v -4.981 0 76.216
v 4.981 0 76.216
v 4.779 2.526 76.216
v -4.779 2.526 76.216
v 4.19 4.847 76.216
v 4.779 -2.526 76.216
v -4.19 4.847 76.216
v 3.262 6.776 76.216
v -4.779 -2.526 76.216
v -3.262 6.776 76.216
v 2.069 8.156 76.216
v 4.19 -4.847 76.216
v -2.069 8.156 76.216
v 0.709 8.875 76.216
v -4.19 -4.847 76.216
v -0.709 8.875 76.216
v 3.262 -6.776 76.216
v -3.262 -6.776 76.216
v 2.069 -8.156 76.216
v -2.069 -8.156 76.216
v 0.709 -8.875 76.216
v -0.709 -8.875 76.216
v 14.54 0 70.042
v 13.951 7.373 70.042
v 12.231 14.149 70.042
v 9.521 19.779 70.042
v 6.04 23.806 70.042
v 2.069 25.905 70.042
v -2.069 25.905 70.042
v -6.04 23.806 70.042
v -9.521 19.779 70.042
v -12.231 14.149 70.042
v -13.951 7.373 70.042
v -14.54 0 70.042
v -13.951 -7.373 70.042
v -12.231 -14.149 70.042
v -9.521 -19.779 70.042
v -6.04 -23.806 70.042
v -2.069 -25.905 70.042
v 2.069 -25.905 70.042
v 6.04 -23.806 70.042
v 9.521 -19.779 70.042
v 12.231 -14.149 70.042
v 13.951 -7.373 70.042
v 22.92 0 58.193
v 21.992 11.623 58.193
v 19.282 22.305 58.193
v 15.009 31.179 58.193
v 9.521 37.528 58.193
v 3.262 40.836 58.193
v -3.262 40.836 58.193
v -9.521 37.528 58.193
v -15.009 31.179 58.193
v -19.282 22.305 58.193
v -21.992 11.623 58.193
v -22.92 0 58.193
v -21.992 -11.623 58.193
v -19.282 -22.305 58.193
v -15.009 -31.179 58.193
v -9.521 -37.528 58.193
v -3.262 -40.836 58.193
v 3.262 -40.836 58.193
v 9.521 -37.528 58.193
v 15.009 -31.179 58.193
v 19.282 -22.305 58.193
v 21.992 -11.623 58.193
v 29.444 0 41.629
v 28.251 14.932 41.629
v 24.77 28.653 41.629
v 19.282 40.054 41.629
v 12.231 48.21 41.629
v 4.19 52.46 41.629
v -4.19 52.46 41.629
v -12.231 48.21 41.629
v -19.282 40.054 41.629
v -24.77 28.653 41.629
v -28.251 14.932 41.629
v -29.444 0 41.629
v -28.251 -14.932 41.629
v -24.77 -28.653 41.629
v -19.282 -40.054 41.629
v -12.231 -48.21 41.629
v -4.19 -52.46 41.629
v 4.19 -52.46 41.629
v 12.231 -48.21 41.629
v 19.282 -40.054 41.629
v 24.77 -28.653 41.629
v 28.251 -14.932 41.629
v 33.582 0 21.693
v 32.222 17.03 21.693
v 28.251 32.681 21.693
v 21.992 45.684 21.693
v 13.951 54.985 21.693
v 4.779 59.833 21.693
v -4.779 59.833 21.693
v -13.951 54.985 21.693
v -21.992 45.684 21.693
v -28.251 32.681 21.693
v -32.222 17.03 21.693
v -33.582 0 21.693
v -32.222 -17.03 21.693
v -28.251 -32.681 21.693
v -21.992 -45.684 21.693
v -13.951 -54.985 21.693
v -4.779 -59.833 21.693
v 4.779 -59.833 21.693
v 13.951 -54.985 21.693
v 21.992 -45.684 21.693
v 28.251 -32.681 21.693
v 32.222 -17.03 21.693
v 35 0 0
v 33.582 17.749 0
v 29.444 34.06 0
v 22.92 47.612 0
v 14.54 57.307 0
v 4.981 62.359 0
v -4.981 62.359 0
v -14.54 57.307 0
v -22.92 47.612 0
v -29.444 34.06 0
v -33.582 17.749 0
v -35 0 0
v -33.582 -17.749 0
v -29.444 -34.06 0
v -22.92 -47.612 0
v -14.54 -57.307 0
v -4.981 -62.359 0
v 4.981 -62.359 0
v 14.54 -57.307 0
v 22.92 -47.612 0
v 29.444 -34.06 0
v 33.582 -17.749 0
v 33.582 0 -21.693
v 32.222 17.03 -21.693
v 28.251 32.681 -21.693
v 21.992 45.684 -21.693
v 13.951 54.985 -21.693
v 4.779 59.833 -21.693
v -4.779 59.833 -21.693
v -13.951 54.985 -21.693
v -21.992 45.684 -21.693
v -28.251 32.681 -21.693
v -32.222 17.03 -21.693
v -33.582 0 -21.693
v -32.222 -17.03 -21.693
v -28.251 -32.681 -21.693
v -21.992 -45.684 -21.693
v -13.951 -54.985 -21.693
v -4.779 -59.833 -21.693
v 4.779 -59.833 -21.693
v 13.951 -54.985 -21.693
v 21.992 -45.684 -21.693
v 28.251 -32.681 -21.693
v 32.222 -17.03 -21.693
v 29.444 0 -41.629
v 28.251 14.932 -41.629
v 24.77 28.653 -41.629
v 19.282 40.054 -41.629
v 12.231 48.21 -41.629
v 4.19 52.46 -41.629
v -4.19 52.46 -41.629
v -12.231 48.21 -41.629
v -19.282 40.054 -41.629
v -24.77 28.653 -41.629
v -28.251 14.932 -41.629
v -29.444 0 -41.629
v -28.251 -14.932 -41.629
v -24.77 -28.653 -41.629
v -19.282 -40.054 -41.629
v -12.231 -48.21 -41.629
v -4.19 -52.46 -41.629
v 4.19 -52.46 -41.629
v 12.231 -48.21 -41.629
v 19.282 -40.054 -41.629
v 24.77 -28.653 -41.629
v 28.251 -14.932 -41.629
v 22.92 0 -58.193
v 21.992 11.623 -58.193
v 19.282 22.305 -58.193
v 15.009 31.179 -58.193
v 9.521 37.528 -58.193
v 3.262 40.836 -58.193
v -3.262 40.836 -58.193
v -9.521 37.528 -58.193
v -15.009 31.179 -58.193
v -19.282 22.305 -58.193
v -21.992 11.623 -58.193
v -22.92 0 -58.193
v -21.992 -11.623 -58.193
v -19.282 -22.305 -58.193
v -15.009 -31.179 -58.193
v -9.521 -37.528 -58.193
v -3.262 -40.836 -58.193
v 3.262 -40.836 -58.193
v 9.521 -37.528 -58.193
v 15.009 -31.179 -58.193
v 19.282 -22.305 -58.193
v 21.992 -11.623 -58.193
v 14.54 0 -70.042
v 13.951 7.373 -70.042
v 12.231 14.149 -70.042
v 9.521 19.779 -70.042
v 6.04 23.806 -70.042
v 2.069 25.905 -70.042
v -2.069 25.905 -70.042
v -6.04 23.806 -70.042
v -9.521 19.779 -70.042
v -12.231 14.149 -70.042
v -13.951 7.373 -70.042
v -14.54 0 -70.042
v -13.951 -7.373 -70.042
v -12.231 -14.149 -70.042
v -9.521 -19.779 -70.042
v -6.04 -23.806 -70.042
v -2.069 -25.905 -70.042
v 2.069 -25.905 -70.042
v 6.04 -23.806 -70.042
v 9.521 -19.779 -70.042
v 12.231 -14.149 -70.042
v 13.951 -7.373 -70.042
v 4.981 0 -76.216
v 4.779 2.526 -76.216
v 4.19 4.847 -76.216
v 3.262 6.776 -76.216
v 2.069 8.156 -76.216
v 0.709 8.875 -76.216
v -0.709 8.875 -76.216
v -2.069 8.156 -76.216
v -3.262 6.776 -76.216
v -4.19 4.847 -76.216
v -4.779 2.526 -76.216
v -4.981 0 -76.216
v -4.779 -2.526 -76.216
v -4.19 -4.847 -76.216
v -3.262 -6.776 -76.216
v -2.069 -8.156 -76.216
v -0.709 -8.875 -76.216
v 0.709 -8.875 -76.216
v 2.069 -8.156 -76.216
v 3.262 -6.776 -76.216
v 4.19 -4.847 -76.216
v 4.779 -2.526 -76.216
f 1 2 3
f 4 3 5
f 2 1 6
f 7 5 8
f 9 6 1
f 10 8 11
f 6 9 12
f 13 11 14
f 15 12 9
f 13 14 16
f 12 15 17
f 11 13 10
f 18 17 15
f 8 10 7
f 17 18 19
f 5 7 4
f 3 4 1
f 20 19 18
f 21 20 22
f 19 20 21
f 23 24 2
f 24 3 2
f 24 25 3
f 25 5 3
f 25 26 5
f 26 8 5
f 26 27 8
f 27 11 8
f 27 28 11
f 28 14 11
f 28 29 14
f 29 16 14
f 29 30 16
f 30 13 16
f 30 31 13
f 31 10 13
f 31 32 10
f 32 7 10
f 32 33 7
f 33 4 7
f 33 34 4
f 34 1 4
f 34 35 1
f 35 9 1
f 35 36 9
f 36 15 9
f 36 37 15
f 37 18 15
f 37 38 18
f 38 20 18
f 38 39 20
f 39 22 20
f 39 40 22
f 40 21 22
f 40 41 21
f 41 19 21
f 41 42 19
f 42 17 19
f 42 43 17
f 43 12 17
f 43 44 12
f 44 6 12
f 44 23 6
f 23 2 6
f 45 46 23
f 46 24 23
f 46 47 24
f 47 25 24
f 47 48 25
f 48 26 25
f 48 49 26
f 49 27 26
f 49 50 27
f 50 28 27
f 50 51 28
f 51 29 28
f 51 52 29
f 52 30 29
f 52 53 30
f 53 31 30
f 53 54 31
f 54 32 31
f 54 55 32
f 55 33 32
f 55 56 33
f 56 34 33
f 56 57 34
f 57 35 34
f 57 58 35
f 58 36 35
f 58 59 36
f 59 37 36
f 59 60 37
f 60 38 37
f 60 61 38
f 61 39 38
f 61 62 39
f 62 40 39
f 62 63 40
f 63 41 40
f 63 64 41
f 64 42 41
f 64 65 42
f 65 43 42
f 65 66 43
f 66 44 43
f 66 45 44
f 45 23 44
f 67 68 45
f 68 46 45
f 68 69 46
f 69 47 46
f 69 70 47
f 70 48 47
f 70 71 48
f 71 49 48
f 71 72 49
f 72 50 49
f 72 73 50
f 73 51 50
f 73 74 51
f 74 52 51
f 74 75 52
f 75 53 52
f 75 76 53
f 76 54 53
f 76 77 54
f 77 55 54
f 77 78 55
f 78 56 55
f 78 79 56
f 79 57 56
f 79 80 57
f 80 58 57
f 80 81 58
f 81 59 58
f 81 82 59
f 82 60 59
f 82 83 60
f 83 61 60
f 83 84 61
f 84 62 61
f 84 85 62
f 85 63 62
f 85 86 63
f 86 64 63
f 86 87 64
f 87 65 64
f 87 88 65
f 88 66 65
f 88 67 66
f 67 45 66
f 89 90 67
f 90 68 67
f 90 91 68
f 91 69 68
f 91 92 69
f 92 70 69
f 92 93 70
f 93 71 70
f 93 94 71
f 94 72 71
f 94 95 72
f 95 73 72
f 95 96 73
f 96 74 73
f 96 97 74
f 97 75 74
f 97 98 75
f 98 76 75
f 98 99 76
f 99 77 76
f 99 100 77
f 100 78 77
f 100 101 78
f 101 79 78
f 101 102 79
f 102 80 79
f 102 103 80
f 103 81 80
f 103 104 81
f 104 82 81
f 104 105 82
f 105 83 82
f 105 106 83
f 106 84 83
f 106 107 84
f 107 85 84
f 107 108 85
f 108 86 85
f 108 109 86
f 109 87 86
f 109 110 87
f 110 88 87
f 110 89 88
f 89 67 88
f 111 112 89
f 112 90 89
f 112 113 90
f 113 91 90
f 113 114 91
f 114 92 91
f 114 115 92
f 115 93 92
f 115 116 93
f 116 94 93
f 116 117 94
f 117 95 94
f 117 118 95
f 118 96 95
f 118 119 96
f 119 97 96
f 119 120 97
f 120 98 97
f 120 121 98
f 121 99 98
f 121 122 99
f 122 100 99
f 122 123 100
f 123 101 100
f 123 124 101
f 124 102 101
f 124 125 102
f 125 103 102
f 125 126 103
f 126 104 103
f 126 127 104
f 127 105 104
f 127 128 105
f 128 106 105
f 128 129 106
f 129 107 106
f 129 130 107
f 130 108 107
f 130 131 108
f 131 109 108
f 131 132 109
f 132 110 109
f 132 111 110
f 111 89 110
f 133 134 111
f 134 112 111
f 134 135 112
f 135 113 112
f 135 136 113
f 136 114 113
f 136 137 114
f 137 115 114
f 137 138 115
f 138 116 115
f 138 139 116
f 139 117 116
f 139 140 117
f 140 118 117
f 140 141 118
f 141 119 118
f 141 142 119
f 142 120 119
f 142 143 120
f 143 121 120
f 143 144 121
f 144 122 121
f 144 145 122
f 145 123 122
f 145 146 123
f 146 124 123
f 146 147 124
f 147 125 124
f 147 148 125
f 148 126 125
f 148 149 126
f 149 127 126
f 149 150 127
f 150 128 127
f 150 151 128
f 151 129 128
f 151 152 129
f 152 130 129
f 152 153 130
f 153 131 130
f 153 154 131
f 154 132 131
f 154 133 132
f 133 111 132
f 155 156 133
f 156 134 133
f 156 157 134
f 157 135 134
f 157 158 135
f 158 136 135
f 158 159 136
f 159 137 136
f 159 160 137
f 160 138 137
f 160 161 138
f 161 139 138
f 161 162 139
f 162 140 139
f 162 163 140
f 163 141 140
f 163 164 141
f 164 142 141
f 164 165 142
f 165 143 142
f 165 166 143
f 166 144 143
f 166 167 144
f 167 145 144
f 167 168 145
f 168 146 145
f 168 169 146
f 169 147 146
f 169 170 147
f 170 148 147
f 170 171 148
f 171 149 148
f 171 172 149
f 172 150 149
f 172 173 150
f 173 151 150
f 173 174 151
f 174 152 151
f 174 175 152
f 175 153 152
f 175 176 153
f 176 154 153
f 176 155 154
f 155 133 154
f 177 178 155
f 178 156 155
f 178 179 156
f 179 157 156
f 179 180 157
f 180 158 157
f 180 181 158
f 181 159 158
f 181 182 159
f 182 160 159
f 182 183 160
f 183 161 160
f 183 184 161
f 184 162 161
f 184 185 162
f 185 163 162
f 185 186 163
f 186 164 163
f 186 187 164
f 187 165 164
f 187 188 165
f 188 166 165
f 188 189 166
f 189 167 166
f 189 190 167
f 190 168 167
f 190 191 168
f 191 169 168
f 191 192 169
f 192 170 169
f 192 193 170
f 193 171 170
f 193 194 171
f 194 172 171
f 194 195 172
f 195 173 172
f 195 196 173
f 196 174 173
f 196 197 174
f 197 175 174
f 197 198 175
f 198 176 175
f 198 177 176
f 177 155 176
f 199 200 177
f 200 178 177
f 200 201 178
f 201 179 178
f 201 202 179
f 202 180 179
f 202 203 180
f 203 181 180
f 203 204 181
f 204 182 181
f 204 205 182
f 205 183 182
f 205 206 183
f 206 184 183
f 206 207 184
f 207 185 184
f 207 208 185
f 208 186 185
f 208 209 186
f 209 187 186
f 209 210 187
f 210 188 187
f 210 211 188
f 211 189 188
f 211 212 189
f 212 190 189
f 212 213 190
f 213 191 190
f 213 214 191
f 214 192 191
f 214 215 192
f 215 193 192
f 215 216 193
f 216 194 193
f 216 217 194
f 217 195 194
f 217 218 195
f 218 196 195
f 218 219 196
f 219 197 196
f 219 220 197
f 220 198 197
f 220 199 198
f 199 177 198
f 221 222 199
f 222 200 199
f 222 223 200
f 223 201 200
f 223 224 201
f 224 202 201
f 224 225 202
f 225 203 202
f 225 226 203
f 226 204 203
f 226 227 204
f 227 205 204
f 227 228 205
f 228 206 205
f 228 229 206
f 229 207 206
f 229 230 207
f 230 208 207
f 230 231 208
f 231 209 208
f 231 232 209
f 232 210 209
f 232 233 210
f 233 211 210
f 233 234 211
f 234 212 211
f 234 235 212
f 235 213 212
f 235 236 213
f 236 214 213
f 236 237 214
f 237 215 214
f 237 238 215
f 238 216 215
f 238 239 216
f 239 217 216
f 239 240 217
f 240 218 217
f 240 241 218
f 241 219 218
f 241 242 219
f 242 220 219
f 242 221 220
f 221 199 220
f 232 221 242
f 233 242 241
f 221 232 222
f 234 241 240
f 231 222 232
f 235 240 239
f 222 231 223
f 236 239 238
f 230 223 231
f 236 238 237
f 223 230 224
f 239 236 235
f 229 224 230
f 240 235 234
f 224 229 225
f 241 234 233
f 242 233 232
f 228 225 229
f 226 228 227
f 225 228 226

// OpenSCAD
// Generated by SolidPython 1.0.1 on 2020-07-29 00:46:46


scale(v = [5, 9, 11]) {
	sphere(r = 7);
}
/***********************************************
*********      SolidPython code:      **********
************************************************
 
# import packages: SolidPython
from solid import *
from solid.utils import *
from itertools import chain, combinations, permutations


class Resize:

    def __init__(self, scad_file):
        self.scad_file = scad_file
        #self.scad_file = import_scad(scad_file)
        # cone/cylinder param:
        self.r1 = 0
        self.r2 = 0
        self.h = 0
        # rectangular prism param:
        self.w = 0
        self.l = 0
        # ellipse param:
        self.r = 0

    # import OpenScad code (file name corresponds to shape)


    # classify shape + parameters
    def assign(self, param1, param2, param3):
        if self.scad_file == 'cone.scad':
            self.r1 = param1
            self.r2 = param2
            self.h = param3
        elif self.scad_file == 'cylinder.scad':
            self.r1 = param1
            self.r2 = param2
            self.h = param3
        elif self.scad_file == 'rectangularPrism.scad':
            self.h = param1
            self.l = param2
            self.w = param3
        else:
            self.r = param1
            self.h = param2

    # resize parameters
    def iterate(self):
        x = range(3, 20, 2)
        i = 1
        if self.scad_file == 'cone.scad':
            tempList = list(permutations(x, 2))
            for temp in tempList:
                param1 = temp[0]
                param2 = temp[1]
                filepath = 'produced_scad_files/' + 'cone' + str(param1) + '_' + str(param2) + '_' + '.scad'
                scad_render_to_file(cylinder(h=param1, r1=param2, r2=0), filepath)

        elif self.scad_file == 'cylinder.scad':
            tempList = list(permutations(x, 3))
            for temp in tempList:
                param1 = temp[0]
                param2 = temp[1]
                filepath = 'produced_scad_files/' + 'cylinder' + str(param1) + '_' + str(param2) + '_' + '.scad'
                scad_render_to_file(cylinder(h=param1, r1=param2, r2=param2), filepath)

        elif self.scad_file == 'rectangularPrism.scad':
            tempList = list(permutations(x, 3))
            for temp in tempList:
                param1 = temp[0]
                param2 = temp[1]
                param3 = temp[2]
                filepath = 'produced_scad_files/' + 'rectangularPrism' + str(param1) + '_' + str(param2) + '_' + str(
                    param3) + '.scad'
                scad_render_to_file(cube(size=(param1, param2, param3)), filepath)

        elif self.scad_file == 'ellipse.scad':
            tempList = list(permutations(x, 4))
            for temp in tempList:
                param1 = temp[0]
                param2 = temp[1]
                param3 = temp[2]
                param4 = temp[3]
                filepath = 'produced_scad_files/' + 'ellipse' + str(param1) + '_' + str(param2) + '_' + str(param3) + '_' + str(param4) + '.scad'
                scad_render_to_file(scale([param1, param2, param3])(sphere(r=param4)), filepath)

    def render_to_scadfile(self):
        scad_render_to_file(scad, 'example.scad') 
 
************************************************/
